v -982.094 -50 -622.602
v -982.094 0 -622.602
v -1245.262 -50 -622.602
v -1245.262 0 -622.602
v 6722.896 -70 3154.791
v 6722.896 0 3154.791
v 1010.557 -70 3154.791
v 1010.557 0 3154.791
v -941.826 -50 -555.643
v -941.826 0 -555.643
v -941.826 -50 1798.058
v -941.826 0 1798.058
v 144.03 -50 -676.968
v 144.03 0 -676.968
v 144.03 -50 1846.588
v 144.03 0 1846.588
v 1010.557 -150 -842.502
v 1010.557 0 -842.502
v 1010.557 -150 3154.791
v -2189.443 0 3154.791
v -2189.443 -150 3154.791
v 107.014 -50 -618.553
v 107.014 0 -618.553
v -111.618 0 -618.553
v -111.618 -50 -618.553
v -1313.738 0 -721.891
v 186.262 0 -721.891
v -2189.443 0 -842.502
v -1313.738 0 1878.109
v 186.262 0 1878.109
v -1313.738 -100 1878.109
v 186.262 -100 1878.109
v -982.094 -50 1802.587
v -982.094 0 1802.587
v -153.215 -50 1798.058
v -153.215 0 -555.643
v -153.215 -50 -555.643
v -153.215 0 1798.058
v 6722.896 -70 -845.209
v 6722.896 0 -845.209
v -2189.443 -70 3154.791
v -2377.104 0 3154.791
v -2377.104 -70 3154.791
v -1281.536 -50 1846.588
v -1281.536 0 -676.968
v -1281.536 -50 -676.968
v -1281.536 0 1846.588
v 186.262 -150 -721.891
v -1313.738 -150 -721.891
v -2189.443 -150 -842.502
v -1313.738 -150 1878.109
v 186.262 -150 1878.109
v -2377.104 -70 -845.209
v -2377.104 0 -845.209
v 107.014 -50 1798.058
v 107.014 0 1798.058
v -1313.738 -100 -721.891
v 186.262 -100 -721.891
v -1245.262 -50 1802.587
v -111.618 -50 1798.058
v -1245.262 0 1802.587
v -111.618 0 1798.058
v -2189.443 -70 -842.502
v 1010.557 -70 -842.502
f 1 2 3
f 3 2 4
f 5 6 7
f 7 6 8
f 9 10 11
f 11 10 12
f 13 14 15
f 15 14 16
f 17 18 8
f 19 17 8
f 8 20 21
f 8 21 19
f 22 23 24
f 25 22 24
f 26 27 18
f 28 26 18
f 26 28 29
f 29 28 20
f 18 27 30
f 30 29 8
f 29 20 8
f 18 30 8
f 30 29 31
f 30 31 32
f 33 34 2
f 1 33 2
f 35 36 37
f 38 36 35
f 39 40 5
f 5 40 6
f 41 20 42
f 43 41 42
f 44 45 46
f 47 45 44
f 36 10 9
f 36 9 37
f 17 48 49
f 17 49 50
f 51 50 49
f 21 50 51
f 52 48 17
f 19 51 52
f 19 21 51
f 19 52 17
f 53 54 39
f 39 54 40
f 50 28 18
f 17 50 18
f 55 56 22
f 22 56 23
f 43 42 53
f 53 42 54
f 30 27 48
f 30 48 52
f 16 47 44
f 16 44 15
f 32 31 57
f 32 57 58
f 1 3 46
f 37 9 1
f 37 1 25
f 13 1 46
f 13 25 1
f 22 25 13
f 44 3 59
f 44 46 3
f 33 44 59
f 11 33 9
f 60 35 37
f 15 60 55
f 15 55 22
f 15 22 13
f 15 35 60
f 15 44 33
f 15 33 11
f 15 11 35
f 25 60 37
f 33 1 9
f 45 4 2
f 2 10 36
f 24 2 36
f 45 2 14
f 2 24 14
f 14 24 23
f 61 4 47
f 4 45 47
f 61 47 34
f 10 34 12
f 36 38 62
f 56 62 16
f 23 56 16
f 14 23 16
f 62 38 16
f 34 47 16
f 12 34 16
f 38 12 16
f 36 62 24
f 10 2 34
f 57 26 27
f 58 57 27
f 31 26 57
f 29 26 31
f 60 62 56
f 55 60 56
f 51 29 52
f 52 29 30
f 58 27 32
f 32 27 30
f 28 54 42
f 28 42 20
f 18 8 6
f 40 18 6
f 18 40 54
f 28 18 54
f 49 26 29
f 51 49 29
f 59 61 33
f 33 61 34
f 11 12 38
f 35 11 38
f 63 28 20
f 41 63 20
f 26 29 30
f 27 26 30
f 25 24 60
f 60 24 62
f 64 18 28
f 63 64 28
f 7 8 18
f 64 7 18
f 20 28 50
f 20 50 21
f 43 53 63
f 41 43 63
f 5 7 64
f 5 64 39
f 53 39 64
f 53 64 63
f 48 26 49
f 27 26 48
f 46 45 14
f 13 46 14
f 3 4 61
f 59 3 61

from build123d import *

# Parameters (mm, degrees)
F1_DEPTH = 70
F0_W     = 3200
F0_H     = 3997.292371
F0_W_2   = 1500
F0_H_2   = 2600
F2_DEPTH = 150
F3_DEPTH = 100
F4_W     = 1425.566227
F4_H     = 2523.555457
F4_W_2   = 788.61104
F4_H_2   = 2353.700698
F5_DEPTH = 50


with BuildPart() as f1:
    # F0 (on Front) → F1 (new body)
    with BuildSketch(Plane.XZ):
        Polygon((-2189.442599, 3154.79085), (-2377.104102, 3154.79085), (-2377.104102, -845.20915), (6722.895898, -845.20915), (6722.895898, 3154.79085), (1010.557401, 3154.79085), (1010.557401, -842.501521), (-2189.442599, -842.501521), align=None)
    extrude(amount=F1_DEPTH)


with BuildPart() as f2:
    # F0 (on Front) → F2 (new body)
    with BuildSketch(Plane.XZ):
        with Locations((-589.442599, 1156.144665)):
            Rectangle(F0_W, F0_H)
        with Locations((-563.738128, 578.109205)):
            Rectangle(F0_W_2, F0_H_2, mode=Mode.SUBTRACT)
    extrude(amount=F2_DEPTH)


with BuildPart() as f3:
    # F0 (on Front) → F3 (new body)
    with BuildSketch(Plane.XZ):
        with Locations((-563.738128, 578.109205)):
            Rectangle(F0_W_2, F0_H_2)
    extrude(amount=F3_DEPTH)


with BuildPart() as f5:
    # F4 (on Front) → F5 (new body)
    with BuildSketch(Plane.XZ):
        with Locations((-568.752632, 584.810168)):
            Rectangle(F4_W, F4_H)
        Polygon((-1245.261669, 806.599259), (-1245.261669, 1802.586555), (-982.094228, 1802.586555), (-982.094228, 806.599259), (-982.094228, 478.652209), (-982.094228, -622.602105), (-1245.261669, -622.602105), (-1245.261669, 478.652209), align=None, mode=Mode.SUBTRACT)
        with Locations((-547.520764, 621.207565)):
            Rectangle(F4_W_2, F4_H_2, mode=Mode.SUBTRACT)
        Polygon((-111.617535, 1798.057914), (107.013837, 1798.057914), (107.013837, 851.135254), (107.013837, 470.554739), (107.013837, -618.55334), (-111.617535, -618.55334), (-111.617535, 470.554739), (-111.617535, 851.135254), align=None, mode=Mode.SUBTRACT)
    extrude(amount=F5_DEPTH)


solid = Compound([f1.part, f2.part, f3.part, f5.part])
